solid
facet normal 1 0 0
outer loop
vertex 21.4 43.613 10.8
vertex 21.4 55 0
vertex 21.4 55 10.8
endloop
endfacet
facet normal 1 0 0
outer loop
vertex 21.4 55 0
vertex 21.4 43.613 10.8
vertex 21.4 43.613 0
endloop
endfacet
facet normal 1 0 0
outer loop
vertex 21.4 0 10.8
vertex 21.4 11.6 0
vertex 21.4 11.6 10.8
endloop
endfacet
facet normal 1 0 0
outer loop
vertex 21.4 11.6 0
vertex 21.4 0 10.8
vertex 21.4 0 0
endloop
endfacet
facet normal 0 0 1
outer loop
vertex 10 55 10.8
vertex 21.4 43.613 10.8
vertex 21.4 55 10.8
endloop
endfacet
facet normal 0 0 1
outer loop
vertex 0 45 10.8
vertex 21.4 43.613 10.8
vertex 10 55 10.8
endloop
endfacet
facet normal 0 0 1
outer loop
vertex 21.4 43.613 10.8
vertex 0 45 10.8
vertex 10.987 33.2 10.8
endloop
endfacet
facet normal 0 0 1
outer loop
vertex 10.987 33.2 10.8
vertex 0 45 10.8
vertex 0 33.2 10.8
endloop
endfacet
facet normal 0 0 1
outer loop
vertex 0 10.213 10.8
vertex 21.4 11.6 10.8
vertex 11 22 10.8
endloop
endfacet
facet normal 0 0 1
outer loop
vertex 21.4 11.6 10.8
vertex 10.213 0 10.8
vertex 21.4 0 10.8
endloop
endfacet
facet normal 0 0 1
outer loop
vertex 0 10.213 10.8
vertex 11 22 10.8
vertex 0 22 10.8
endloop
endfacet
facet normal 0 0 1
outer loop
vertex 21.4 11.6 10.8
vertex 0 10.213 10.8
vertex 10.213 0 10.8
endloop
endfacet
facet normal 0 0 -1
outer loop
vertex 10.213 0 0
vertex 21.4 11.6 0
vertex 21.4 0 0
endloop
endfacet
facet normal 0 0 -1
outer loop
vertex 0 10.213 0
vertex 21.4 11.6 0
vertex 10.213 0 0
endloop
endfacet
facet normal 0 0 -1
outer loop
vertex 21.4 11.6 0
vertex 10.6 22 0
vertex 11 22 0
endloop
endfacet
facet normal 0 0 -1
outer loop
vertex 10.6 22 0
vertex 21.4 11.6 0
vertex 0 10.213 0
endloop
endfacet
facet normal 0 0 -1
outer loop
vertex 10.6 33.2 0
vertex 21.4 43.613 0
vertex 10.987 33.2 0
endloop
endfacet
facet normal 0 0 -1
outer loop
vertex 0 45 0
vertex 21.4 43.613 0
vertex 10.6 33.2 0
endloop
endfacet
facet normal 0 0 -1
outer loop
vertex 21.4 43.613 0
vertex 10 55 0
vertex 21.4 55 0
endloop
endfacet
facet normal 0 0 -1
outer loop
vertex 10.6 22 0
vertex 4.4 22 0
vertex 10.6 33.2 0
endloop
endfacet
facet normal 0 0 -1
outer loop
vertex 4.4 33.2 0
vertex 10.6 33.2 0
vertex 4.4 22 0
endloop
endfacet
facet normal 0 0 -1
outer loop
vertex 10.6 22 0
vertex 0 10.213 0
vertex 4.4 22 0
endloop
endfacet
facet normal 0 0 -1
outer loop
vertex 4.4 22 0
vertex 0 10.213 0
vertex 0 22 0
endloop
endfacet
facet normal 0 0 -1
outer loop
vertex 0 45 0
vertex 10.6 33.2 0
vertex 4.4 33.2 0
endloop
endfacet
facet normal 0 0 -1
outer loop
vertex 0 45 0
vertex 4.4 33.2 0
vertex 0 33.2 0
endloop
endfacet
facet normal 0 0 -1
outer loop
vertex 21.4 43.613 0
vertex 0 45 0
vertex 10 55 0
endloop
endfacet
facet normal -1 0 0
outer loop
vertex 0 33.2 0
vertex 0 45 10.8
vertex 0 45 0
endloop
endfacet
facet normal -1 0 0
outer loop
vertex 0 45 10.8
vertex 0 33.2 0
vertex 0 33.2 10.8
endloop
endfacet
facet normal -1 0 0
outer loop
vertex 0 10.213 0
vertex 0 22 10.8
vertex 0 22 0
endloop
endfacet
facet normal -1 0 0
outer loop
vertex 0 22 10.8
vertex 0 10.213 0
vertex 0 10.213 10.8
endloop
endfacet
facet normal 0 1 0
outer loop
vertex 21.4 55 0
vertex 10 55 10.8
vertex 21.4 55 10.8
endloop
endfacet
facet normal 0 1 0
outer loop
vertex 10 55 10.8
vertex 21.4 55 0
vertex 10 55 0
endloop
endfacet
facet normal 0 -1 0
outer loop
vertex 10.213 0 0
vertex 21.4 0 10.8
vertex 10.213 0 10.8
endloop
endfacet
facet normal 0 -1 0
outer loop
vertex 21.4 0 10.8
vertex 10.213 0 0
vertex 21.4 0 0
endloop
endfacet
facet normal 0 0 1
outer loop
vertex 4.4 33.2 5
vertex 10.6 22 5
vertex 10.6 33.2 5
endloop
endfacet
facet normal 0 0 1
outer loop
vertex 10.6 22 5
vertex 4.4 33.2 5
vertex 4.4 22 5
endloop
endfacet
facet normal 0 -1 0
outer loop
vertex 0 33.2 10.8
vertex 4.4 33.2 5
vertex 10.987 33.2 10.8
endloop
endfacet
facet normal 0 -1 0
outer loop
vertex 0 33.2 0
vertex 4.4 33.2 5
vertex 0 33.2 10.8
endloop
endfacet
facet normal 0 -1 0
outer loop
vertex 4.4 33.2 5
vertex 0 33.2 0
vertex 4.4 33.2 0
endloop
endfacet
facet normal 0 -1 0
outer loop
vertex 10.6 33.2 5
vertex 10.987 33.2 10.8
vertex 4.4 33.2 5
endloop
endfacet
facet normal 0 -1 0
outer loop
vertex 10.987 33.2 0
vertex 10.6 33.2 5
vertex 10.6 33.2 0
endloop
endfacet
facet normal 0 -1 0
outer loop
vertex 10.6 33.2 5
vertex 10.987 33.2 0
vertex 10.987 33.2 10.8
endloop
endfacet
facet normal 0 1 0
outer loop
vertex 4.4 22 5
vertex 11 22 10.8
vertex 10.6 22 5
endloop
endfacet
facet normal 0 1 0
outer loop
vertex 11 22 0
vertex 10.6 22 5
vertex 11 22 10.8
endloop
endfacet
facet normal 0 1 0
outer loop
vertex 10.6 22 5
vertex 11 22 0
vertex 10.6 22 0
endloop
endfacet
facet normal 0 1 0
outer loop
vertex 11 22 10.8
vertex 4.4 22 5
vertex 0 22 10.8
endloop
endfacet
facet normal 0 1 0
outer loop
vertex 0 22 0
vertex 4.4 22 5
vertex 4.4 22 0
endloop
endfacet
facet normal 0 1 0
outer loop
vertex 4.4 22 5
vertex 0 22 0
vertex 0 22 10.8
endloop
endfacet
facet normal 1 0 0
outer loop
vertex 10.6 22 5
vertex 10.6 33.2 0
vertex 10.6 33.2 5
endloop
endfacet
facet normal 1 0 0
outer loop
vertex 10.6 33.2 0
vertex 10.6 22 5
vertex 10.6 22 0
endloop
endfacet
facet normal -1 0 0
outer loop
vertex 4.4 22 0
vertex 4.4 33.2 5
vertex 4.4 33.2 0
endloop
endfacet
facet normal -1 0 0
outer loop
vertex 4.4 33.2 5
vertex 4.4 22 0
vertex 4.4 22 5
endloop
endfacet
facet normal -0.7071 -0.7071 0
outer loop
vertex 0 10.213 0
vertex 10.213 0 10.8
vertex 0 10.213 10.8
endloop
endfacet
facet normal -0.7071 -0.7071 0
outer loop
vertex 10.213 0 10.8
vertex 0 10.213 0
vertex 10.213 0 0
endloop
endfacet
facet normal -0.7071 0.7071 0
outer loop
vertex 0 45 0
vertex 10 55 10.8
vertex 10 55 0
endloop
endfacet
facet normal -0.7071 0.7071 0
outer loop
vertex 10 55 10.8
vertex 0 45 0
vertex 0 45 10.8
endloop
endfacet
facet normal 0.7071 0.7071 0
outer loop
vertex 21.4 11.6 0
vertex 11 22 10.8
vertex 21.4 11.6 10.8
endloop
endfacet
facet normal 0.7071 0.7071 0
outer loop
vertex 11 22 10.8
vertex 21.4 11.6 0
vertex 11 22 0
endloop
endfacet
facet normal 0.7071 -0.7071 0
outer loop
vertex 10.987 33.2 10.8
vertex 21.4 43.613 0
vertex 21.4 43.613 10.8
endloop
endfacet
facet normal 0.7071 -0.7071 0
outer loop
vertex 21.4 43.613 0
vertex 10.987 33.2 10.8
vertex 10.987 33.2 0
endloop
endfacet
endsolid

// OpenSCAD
difference(){
cube ([21.4,55,10.8]);
translate([-1,22,5]) cube([13,11.2,7]);
translate([10.6,22,-1]) cube([20,11.2,13]);
translate([-1,22,-1]) cube([5.4,11.2,7]);
translate([0,-11,-1]) rotate(a=[0,0,45]) cube(15);
translate([0,45,-1]) rotate(a=[0,0,45]) cube(15);
translate([21.5,11.5,-1]) rotate(a=[0,0,45]) cube(15);
translate([21.5,22.5,-1]) rotate(a=[0,0,45]) cube(15);
}
